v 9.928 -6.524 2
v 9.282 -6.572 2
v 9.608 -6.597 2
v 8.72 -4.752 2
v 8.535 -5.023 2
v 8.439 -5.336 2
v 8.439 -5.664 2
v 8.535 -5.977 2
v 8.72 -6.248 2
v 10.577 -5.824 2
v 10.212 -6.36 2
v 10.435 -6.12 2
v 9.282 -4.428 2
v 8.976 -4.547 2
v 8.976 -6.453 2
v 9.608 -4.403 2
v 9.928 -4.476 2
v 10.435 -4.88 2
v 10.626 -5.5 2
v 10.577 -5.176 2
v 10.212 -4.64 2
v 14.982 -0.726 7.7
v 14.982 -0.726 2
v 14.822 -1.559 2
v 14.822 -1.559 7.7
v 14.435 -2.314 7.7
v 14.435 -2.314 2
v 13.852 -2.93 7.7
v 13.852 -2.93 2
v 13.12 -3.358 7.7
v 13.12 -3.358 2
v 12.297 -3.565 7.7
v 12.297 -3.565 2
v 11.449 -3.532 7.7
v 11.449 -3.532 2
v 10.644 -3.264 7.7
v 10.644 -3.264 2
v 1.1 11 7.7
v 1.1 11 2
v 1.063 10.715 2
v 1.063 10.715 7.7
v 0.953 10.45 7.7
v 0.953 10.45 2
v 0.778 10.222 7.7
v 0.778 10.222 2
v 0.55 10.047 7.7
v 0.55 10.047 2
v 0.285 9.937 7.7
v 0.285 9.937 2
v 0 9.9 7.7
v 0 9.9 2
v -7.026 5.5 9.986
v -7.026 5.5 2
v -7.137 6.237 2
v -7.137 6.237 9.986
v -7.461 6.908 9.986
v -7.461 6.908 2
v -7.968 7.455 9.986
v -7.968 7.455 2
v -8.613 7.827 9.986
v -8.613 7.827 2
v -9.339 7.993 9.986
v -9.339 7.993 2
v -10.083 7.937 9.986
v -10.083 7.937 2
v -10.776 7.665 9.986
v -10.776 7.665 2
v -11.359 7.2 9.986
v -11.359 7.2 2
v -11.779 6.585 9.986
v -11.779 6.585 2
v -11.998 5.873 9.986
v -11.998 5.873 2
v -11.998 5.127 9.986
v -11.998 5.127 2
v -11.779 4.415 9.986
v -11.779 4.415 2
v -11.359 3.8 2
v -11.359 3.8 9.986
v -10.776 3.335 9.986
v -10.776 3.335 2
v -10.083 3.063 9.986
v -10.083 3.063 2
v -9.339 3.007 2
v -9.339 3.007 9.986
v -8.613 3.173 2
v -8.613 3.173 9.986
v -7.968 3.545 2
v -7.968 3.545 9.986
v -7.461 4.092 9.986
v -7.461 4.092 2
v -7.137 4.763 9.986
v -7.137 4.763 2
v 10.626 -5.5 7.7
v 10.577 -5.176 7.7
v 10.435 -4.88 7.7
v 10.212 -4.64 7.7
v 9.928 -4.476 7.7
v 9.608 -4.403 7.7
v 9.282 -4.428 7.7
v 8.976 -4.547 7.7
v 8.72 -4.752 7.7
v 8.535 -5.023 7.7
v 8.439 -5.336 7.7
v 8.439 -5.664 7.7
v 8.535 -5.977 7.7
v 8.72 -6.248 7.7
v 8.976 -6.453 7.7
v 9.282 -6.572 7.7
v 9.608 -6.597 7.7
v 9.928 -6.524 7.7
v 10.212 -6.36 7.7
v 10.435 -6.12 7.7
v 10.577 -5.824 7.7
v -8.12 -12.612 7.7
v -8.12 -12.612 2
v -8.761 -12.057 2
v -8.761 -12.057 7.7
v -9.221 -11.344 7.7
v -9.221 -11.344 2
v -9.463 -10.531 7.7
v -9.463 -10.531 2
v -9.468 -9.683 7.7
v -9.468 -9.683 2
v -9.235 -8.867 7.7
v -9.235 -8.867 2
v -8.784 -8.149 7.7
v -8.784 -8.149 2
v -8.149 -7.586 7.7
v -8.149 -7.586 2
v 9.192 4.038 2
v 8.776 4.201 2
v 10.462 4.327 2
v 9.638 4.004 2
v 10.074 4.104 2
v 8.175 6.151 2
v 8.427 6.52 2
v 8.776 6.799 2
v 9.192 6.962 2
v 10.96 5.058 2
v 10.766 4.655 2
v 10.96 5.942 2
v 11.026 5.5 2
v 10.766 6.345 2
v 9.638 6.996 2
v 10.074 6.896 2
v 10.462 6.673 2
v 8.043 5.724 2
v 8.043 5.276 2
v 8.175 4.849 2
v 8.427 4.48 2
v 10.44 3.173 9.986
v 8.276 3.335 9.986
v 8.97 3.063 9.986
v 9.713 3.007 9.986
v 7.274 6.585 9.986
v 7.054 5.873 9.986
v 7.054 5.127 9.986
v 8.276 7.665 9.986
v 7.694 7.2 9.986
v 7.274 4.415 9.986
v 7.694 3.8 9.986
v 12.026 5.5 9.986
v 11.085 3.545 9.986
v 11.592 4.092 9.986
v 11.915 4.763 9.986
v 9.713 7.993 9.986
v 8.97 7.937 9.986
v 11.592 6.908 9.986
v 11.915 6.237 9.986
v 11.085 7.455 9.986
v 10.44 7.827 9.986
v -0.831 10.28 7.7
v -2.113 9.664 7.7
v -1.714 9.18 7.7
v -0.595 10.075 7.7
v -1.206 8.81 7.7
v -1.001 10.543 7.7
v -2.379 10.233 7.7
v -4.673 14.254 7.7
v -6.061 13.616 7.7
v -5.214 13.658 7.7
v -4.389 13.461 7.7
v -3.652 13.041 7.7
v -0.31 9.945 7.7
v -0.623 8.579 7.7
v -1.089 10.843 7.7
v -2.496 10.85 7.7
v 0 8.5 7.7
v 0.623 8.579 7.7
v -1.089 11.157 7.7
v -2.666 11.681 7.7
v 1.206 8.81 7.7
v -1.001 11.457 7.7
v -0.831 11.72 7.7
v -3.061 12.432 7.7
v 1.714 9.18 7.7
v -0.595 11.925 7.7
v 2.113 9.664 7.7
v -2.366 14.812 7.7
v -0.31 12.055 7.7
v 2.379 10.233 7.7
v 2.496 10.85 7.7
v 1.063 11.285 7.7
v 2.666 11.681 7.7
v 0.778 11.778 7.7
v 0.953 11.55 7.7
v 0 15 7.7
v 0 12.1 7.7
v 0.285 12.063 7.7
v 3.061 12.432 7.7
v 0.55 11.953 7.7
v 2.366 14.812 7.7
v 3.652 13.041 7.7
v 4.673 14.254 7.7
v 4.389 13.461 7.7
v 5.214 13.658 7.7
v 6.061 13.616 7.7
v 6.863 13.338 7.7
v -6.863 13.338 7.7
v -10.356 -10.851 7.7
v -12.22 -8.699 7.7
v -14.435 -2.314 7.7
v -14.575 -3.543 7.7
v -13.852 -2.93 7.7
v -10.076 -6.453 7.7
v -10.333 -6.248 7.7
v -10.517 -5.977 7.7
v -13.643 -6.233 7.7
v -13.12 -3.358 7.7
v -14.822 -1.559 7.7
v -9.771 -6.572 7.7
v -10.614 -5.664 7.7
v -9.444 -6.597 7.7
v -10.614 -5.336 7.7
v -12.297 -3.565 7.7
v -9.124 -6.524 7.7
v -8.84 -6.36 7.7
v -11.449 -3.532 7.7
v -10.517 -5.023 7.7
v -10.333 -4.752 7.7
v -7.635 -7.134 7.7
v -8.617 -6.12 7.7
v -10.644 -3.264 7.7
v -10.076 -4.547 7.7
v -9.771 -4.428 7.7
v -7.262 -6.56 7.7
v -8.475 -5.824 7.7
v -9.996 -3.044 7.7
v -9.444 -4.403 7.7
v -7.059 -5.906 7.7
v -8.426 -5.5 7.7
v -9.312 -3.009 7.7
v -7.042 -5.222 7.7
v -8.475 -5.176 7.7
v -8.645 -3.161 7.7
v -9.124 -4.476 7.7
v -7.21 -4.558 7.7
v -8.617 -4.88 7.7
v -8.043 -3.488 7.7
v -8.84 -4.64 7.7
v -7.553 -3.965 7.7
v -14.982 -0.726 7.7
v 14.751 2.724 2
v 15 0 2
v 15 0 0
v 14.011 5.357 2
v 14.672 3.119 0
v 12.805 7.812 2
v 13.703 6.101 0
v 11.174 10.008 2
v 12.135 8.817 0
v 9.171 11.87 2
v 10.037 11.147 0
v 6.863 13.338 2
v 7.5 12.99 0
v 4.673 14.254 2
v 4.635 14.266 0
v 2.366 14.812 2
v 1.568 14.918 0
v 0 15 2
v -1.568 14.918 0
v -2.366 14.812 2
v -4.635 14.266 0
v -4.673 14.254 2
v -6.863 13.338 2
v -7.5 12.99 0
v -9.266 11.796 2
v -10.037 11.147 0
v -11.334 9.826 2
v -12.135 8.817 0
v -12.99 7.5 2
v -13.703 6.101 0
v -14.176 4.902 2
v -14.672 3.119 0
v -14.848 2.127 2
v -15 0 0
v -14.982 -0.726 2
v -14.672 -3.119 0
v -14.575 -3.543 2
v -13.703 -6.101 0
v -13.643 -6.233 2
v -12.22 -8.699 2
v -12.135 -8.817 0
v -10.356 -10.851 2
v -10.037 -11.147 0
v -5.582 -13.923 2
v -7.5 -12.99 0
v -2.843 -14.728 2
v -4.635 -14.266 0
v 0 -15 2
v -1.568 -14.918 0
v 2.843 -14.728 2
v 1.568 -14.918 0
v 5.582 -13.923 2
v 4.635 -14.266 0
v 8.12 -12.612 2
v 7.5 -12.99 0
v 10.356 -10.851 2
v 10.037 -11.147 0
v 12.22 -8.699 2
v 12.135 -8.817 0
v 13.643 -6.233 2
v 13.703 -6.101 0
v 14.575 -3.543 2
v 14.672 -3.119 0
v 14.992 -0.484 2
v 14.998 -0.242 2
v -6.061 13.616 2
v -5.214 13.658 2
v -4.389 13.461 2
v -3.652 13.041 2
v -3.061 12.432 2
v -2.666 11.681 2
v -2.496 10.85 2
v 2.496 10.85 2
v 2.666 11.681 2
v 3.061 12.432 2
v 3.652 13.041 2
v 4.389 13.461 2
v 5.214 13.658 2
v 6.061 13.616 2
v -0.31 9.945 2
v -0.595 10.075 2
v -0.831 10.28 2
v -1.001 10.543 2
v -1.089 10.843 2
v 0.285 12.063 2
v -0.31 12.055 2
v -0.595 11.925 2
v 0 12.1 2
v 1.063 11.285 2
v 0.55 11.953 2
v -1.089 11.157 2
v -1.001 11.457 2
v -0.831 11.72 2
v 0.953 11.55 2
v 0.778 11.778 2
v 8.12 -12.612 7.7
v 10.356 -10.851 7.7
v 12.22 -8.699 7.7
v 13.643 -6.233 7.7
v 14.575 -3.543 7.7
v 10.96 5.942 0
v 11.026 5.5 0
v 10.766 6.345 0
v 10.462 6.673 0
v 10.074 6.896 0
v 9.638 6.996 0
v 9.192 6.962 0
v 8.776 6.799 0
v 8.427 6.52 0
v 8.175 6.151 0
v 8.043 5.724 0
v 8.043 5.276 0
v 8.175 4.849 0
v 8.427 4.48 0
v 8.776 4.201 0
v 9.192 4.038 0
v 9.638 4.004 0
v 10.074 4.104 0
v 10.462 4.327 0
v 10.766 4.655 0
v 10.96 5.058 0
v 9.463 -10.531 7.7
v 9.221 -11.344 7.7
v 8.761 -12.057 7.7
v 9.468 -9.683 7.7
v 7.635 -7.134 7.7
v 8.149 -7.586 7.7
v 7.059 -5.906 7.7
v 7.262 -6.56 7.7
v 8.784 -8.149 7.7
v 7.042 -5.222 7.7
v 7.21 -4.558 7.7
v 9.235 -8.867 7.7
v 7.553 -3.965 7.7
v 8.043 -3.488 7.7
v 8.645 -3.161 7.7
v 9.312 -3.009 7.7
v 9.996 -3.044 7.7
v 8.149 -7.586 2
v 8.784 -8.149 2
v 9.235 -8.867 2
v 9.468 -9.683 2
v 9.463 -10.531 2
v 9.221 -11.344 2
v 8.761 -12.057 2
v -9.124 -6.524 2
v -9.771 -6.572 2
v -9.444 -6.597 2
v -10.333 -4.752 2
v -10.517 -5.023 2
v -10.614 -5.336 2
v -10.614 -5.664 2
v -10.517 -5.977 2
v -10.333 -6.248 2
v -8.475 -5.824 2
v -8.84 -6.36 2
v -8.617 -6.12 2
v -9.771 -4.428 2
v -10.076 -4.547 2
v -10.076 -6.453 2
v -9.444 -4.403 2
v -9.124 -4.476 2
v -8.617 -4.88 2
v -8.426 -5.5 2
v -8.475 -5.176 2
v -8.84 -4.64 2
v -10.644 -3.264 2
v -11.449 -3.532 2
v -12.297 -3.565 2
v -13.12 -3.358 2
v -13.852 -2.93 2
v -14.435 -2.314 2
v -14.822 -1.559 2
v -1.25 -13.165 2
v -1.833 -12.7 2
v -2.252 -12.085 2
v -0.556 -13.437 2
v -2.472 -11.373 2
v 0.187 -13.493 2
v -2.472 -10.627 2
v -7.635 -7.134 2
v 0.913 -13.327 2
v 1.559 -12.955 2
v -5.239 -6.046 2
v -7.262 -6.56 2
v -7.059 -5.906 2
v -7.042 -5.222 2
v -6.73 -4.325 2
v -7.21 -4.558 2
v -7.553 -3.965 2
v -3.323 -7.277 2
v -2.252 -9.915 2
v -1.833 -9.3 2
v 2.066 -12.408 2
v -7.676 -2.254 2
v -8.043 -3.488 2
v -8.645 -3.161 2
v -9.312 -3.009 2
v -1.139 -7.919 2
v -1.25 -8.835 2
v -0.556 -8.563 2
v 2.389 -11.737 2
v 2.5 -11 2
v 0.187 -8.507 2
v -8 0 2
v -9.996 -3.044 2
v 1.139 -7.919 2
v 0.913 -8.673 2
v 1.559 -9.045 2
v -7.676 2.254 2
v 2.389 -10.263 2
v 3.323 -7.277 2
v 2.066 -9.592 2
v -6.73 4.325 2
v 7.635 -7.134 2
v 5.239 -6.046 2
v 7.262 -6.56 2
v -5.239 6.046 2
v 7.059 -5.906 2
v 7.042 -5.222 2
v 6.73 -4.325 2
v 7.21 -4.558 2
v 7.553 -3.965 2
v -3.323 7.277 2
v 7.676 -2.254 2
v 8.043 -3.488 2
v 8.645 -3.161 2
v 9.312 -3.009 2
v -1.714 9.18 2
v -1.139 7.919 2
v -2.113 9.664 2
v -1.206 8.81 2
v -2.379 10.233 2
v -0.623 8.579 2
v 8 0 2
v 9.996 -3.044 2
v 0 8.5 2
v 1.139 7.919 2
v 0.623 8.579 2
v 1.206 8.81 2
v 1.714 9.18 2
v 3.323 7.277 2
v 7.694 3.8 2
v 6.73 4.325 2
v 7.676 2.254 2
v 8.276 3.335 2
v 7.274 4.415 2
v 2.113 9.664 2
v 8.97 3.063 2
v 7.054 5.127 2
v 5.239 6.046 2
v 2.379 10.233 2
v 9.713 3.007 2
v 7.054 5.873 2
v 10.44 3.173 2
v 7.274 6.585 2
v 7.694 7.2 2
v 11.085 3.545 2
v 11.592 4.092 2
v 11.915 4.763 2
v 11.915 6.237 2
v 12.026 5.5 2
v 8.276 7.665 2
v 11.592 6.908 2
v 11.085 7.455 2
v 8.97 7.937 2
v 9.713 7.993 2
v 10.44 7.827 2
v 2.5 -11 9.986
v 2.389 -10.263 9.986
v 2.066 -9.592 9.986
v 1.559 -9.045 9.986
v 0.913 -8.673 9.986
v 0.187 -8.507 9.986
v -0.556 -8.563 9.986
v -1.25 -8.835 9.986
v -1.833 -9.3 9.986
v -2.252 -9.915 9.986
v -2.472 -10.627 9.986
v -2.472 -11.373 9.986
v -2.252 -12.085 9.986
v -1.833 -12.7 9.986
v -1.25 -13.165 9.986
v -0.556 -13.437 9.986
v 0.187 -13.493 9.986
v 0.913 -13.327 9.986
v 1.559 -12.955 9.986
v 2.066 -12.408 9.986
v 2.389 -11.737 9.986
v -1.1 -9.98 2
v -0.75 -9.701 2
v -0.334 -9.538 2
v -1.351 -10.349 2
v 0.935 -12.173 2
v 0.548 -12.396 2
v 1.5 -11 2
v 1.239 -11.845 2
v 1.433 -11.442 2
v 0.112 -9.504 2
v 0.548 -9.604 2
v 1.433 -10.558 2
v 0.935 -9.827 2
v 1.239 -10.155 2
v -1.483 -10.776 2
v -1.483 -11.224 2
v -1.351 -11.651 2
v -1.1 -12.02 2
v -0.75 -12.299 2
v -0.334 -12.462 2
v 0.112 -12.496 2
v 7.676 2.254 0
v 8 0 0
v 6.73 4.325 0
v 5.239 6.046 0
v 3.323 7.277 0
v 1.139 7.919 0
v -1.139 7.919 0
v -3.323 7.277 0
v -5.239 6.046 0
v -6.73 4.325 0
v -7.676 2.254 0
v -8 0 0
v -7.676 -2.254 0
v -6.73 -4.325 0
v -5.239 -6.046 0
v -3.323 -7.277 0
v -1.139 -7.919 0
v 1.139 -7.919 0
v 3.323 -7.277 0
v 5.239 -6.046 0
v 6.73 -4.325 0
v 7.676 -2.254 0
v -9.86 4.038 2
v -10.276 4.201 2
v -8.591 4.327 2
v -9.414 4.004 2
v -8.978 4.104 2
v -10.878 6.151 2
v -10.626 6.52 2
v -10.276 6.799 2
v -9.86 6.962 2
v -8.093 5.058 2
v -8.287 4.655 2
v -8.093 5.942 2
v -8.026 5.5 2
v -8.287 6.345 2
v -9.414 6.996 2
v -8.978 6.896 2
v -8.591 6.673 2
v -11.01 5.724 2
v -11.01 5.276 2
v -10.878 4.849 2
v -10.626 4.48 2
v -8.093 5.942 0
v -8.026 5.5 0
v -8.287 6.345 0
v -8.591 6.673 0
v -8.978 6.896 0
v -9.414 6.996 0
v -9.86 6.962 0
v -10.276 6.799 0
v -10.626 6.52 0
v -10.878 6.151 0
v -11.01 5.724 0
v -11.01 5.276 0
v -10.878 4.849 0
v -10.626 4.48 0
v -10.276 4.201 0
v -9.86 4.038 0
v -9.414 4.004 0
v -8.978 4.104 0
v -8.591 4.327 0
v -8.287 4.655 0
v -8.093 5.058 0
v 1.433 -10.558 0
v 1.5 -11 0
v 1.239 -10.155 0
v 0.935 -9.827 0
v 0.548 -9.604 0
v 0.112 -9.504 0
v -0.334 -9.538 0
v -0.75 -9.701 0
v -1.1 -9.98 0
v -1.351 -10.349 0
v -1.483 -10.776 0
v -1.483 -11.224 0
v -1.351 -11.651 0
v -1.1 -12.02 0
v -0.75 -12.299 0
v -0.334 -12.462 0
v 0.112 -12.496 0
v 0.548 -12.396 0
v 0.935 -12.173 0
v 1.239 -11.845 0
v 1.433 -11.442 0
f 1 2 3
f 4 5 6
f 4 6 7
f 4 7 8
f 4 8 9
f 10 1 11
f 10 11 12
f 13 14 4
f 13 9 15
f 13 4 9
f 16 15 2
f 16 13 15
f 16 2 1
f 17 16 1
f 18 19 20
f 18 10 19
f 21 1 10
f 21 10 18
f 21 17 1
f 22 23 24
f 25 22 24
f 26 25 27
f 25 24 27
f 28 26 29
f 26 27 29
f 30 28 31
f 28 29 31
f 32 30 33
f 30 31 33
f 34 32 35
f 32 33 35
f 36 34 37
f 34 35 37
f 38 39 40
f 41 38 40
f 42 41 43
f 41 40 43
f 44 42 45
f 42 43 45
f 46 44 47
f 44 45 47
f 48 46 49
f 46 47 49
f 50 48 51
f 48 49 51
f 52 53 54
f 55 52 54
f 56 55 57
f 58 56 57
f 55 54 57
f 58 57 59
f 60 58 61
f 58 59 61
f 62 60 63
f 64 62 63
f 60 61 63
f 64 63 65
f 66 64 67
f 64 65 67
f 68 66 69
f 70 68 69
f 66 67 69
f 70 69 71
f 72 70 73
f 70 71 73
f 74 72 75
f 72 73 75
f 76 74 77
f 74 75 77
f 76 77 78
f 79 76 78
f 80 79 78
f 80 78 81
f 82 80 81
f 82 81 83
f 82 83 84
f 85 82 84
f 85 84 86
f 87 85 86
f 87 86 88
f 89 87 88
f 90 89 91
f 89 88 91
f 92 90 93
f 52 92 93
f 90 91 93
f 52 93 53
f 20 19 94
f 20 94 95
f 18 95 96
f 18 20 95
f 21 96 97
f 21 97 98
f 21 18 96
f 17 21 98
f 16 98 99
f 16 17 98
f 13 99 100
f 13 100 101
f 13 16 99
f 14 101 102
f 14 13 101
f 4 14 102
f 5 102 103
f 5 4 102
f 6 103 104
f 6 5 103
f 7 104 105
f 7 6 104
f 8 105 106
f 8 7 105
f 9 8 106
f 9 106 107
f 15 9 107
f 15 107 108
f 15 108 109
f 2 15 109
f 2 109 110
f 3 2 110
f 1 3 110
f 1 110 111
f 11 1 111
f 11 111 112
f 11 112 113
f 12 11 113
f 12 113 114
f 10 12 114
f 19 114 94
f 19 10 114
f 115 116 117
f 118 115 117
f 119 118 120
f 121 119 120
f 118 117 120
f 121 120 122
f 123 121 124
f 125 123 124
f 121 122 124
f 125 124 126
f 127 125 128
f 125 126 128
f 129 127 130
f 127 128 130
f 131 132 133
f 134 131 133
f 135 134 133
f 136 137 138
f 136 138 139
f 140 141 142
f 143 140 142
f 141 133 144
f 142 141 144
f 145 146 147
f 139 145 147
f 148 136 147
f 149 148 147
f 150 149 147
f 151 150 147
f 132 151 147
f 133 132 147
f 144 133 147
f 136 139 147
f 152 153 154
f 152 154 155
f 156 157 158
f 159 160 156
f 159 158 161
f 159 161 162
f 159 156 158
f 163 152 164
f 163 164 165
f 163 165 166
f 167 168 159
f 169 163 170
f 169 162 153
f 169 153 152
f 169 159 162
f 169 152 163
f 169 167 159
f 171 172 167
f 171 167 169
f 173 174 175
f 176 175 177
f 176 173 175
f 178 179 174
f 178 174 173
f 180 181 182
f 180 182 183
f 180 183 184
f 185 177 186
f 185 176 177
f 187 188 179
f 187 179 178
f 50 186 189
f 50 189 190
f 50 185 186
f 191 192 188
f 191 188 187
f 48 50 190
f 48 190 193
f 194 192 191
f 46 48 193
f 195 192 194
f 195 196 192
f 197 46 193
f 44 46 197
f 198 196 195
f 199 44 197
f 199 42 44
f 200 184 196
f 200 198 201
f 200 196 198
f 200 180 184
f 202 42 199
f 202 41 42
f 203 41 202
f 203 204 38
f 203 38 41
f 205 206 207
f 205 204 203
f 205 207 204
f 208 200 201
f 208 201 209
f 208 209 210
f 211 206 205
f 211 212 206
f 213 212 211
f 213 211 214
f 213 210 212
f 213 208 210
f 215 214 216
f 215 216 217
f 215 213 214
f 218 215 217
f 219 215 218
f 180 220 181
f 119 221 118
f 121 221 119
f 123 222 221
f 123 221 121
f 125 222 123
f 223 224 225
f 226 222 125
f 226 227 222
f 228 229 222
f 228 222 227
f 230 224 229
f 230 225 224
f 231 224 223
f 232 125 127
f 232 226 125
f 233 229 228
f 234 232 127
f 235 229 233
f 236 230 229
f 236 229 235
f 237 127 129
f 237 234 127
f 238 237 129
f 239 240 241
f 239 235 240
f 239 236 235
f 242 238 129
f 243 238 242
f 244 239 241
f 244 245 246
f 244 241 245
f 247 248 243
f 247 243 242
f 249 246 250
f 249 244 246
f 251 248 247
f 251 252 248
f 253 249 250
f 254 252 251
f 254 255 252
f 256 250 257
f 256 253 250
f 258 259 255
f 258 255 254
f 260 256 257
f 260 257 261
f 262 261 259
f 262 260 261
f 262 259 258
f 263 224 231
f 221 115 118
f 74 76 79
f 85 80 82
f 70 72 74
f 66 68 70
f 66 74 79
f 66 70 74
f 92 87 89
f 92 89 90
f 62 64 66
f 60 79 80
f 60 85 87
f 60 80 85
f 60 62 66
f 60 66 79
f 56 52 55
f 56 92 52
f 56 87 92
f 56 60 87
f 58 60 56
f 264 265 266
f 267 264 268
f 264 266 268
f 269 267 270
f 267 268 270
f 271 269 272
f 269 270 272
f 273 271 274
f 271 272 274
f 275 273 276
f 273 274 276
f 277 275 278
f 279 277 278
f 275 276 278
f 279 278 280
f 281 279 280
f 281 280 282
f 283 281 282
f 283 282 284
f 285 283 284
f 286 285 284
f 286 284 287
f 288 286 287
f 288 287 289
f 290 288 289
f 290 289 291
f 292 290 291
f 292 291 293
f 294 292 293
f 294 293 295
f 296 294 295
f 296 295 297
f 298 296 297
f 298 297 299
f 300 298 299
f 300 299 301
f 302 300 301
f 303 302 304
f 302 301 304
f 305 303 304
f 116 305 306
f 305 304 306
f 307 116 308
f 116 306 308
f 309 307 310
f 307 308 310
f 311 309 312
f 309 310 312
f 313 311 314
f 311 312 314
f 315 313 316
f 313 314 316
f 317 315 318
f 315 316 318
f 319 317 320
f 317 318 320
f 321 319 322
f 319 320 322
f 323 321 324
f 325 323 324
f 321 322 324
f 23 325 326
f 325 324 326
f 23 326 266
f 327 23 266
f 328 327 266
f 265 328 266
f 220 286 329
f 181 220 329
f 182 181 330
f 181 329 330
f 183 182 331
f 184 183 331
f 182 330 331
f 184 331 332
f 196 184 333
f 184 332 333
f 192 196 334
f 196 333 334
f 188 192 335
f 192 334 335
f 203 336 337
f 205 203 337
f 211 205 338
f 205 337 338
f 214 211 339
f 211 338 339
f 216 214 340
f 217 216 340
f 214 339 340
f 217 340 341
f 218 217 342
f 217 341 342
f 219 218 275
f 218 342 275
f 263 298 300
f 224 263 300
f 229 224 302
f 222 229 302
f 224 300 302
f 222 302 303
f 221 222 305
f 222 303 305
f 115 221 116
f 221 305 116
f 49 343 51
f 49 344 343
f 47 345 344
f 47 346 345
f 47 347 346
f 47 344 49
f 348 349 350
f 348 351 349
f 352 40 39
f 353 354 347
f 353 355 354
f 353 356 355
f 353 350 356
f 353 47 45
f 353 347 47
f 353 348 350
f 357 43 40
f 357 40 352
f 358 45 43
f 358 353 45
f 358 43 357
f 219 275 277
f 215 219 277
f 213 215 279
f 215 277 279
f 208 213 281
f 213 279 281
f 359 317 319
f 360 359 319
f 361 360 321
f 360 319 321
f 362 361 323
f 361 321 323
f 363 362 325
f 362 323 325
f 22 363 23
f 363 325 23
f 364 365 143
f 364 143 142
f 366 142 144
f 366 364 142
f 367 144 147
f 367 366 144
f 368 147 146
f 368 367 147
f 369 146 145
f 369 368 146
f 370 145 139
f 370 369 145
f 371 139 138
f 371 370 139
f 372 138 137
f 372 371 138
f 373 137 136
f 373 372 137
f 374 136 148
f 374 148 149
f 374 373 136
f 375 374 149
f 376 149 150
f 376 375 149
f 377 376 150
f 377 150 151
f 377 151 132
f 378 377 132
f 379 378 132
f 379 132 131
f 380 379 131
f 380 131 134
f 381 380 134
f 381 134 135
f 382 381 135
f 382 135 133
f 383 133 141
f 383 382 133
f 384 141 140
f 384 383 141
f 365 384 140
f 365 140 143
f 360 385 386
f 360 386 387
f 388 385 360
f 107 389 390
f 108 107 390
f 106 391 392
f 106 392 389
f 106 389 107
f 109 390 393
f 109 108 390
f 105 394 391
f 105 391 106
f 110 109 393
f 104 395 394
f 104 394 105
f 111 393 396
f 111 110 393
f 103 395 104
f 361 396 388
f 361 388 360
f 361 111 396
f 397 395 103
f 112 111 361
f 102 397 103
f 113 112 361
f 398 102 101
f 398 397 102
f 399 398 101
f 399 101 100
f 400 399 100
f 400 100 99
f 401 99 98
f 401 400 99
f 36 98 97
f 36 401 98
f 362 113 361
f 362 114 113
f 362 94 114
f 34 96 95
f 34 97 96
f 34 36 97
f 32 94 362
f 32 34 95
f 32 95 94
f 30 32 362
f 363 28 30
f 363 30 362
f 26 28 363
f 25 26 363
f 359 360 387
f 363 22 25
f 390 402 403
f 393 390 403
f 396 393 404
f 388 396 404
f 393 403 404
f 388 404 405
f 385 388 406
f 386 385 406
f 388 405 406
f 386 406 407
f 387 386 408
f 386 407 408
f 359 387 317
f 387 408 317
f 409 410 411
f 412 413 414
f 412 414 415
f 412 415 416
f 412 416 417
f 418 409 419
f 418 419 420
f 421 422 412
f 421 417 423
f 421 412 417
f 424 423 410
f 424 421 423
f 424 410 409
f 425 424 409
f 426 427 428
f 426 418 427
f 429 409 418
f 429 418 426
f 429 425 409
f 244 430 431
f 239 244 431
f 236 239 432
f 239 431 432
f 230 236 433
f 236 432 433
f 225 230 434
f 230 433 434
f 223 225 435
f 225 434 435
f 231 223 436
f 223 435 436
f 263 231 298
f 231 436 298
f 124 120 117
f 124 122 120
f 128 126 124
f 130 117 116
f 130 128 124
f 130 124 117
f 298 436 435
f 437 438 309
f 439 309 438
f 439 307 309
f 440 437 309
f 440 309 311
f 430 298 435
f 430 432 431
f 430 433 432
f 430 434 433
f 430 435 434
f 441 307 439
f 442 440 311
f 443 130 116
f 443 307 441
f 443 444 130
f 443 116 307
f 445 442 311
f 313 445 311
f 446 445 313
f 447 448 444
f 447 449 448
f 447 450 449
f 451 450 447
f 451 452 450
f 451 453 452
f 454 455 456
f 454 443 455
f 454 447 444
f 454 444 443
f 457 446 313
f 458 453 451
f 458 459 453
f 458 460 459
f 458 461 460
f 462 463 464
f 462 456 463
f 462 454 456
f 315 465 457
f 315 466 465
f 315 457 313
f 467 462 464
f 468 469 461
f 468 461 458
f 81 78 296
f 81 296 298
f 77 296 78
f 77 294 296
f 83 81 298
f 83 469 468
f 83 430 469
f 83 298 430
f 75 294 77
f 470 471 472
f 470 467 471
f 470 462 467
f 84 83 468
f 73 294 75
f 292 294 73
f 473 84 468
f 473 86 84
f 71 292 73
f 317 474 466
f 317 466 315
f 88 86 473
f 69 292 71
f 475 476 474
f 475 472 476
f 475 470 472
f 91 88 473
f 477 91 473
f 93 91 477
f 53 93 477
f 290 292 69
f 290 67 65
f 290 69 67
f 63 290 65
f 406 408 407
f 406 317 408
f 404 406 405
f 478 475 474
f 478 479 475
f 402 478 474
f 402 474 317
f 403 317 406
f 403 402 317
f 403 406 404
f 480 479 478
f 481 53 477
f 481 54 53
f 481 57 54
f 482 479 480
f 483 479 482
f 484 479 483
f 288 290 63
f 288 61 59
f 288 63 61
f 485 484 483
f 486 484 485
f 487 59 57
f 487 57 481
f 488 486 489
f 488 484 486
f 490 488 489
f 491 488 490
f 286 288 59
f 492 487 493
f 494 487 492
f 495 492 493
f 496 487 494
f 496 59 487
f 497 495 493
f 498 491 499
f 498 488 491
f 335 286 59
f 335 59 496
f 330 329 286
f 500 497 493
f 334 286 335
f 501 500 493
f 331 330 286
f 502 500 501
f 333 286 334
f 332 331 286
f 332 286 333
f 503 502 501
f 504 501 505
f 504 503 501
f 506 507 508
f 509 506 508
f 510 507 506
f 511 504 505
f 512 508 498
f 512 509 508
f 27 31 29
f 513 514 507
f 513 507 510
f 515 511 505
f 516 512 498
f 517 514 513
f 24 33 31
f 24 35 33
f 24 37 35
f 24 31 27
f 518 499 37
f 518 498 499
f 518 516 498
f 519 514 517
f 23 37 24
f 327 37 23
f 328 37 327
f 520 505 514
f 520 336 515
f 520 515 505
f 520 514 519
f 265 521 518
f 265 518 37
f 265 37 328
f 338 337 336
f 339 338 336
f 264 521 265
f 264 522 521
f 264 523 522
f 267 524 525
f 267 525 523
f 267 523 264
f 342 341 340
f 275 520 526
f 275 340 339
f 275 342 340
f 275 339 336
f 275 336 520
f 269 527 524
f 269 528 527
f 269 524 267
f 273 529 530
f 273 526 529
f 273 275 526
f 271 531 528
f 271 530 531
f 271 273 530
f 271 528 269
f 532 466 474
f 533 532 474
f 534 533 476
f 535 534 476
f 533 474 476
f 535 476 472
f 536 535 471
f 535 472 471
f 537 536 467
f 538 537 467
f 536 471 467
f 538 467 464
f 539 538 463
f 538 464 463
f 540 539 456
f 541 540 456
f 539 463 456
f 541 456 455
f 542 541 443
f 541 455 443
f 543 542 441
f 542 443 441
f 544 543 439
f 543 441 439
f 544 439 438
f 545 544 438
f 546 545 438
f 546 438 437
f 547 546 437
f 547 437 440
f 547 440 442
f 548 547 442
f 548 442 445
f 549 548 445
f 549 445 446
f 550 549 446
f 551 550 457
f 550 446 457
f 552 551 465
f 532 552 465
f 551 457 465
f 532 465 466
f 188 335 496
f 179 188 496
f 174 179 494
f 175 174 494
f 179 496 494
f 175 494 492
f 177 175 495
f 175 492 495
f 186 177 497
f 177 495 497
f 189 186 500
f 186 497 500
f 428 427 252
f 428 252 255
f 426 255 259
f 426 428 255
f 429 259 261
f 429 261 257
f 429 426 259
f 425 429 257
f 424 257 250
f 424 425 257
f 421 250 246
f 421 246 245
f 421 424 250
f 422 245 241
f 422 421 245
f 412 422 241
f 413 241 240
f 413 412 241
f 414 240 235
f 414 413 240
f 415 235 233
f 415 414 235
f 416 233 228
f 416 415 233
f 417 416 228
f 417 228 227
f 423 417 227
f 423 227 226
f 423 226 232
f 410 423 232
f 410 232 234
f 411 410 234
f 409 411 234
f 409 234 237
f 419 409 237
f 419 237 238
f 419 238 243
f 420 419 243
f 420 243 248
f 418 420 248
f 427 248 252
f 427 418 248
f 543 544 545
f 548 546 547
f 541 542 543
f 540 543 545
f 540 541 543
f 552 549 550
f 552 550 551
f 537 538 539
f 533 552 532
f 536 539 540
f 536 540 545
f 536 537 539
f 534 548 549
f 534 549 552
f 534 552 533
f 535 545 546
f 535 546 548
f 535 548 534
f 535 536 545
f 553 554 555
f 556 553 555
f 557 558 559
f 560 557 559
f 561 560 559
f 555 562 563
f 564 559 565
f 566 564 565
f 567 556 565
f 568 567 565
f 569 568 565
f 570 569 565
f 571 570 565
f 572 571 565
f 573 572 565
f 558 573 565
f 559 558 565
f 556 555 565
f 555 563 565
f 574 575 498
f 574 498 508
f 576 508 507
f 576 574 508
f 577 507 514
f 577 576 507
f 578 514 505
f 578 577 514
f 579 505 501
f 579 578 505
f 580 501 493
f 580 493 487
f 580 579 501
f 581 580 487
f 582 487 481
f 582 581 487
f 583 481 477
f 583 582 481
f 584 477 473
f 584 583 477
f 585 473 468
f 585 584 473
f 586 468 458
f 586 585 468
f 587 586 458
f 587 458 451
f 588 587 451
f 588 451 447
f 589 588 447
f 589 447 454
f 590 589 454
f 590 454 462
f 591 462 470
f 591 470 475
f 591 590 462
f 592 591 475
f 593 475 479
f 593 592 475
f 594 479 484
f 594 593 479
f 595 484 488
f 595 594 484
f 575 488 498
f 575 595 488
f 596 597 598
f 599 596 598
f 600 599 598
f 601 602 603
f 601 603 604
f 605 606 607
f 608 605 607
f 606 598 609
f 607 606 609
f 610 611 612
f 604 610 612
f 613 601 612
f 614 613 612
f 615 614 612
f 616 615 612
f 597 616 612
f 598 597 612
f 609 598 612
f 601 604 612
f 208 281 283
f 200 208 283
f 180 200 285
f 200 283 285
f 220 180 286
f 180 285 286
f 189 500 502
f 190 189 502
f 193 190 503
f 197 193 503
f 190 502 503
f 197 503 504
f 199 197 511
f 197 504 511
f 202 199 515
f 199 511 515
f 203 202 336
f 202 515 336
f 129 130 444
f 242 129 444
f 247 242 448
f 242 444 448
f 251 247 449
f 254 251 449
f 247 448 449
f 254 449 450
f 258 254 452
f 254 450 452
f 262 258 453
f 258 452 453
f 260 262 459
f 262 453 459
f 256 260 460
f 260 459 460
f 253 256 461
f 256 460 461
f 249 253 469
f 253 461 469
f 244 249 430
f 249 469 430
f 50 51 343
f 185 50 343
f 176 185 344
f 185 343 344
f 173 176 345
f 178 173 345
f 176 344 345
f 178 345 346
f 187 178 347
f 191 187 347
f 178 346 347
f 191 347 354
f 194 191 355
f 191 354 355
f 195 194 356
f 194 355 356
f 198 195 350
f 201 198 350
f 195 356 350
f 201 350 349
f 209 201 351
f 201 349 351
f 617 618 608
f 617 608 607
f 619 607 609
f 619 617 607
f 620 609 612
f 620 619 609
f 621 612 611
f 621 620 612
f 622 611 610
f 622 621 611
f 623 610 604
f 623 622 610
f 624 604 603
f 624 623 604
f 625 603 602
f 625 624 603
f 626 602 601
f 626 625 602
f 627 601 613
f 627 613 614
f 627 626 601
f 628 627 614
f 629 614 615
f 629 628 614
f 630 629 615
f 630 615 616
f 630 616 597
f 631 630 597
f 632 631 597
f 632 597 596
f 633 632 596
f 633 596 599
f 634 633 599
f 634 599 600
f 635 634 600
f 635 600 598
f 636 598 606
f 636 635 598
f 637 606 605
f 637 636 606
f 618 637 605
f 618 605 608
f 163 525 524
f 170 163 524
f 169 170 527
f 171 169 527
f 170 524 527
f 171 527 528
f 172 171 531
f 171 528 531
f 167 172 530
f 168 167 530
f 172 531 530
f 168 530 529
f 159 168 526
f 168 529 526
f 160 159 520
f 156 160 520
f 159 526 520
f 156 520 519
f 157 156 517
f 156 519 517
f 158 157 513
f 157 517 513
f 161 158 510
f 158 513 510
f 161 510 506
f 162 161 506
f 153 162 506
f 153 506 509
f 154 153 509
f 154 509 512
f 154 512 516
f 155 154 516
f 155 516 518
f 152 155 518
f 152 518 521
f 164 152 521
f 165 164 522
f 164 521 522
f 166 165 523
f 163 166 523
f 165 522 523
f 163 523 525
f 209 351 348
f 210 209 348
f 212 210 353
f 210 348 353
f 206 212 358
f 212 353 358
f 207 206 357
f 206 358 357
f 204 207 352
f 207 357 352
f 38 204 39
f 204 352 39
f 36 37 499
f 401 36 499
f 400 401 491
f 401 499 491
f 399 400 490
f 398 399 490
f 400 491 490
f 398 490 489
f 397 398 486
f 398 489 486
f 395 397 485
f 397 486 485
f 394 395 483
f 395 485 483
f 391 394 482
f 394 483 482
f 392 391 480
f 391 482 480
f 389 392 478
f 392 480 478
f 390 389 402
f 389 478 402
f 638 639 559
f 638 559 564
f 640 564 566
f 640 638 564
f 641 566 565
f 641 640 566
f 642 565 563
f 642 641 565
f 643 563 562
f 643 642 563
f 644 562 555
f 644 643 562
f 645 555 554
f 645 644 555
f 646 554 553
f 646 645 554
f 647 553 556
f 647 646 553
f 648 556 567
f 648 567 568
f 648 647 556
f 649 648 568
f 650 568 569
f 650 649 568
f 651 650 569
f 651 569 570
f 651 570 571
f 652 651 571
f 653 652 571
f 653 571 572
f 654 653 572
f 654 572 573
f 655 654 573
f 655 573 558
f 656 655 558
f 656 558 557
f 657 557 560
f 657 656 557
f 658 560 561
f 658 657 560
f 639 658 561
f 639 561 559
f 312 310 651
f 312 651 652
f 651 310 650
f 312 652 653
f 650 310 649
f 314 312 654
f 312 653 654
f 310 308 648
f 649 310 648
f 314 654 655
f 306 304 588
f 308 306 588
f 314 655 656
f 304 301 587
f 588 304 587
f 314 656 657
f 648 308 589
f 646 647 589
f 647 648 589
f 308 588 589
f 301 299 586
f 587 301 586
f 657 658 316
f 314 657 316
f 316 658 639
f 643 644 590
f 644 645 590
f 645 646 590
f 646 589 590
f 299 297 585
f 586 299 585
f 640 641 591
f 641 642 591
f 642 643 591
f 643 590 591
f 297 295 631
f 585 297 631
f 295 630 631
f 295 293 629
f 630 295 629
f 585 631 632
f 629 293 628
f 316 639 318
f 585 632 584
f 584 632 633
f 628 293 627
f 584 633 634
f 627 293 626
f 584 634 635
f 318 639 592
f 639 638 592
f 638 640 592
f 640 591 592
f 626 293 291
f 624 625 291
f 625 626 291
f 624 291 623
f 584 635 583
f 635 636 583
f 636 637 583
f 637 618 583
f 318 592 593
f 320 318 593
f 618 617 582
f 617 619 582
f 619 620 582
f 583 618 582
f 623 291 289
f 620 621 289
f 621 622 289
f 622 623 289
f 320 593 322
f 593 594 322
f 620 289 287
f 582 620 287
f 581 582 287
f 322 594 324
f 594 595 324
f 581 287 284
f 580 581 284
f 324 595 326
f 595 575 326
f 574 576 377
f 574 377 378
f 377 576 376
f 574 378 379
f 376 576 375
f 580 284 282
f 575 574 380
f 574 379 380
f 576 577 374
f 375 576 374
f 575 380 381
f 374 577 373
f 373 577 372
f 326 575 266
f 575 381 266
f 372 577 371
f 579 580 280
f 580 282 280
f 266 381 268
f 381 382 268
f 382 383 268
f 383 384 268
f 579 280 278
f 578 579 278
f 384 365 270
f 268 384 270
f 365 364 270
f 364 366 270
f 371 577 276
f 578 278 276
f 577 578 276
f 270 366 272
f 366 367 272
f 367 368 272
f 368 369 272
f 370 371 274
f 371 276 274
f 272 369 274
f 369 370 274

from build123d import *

# Parameters (mm, degrees)
SKETCH1_R           = 15
SKETCH1_R_2         = 8
SKETCH1_R_3         = 1.5
BOSS_EXTRUDE1_DEPTH = 2
SKETCH2_R           = 2.5
SKETCH2_R_2         = 1.5
BOSS_EXTRUDE2_DEPTH = 7.985619116
SKETCH3_R           = 1.1
BOSS_EXTRUDE3_DEPTH = 5.7


with BuildPart() as part:
    # Sketch1 → Boss-Extrude1 (new body)
    with BuildSketch(Plane.XY):
        Circle(SKETCH1_R)
        Circle(SKETCH1_R_2, mode=Mode.SUBTRACT)
        with Locations((9.526279442, 5.5)):
            Circle(SKETCH1_R_3, mode=Mode.SUBTRACT)
        with Locations((0, -11)):
            Circle(SKETCH1_R_3, mode=Mode.SUBTRACT)
        with Locations((-9.526279442, 5.5)):
            Circle(SKETCH1_R_3, mode=Mode.SUBTRACT)
    extrude(amount=BOSS_EXTRUDE1_DEPTH)

    # Sketch2 → Boss-Extrude2 (add)
    # profile 1 of 6: a face of its own
    with BuildSketch(Plane.XY.offset(2)):
        with Locations((-9.526279442, 5.5)):
            Circle(SKETCH2_R)
        with Locations((-9.526279442, 5.5)):
            Circle(SKETCH2_R_2, mode=Mode.SUBTRACT)
    # profile 2 of 6: a face of its own
    with BuildSketch(Plane.XY.offset(2)):
        with Locations((9.526279442, 5.5)):
            Circle(SKETCH2_R)
        with Locations((9.526279442, 5.5)):
            Circle(SKETCH2_R_2, mode=Mode.SUBTRACT)
    # profile 3 of 6: a face of its own
    with BuildSketch(Plane.XY.offset(2)):
        with Locations((-9.526279442, 5.5)):
            Circle(SKETCH2_R_2)
    # profile 4 of 6: a face of its own
    with BuildSketch(Plane.XY.offset(2)):
        with Locations((9.526279442, 5.5)):
            Circle(SKETCH2_R_2)
    # profile 5 of 6: a face of its own
    with BuildSketch(Plane.XY.offset(2)):
        with Locations((0, -11)):
            Circle(SKETCH2_R)
        with Locations((0, -11)):
            Circle(SKETCH2_R_2, mode=Mode.SUBTRACT)
    # profile 6 of 6: a face of its own
    with BuildSketch(Plane.XY.offset(2)):
        with Locations((0, -11)):
            Circle(SKETCH2_R_2)
    extrude(amount=BOSS_EXTRUDE2_DEPTH)

    # Sketch3 → Boss-Extrude3 (add)
    # profile 1 of 4: a face of its own
    with BuildSketch(Plane.XY.offset(2)):
        with BuildLine():
            ThreePointArc((-10.644308739, -3.263929677), (-13.500919136, -3.170017803), (-14.982429868, -0.725806611))
            ThreePointArc((-14.982429868, -0.725806611), (-12.990381057, -7.5), (-8.119781897, -12.612261571))
            ThreePointArc((-8.119781897, -12.612261571), (-9.495775516, -10.107130045), (-8.148800385, -7.586276935))
            ThreePointArc((-8.148800385, -7.586276935), (-7.361215932, -4.25), (-10.644308739, -3.263929677))
        make_face()
        with Locations((-9.526279442, -5.5)):
            Circle(SKETCH3_R, mode=Mode.SUBTRACT)
    # profile 2 of 4: a face of its own
    with BuildSketch(Plane.XY.offset(2)):
        with BuildLine():
            ThreePointArc((8.119781897, -12.612261571), (12.990381057, -7.5), (14.982429868, -0.725806611))
            ThreePointArc((14.982429868, -0.725806611), (13.500919136, -3.170017803), (10.644308739, -3.263929677))
            ThreePointArc((10.644308739, -3.263929677), (7.361215932, -4.25), (8.148800385, -7.586276935))
            ThreePointArc((8.148800385, -7.586276935), (9.495775516, -10.107130045), (8.119781897, -12.612261571))
        make_face()
        with Locations((9.526279442, -5.5)):
            Circle(SKETCH3_R, mode=Mode.SUBTRACT)
    # profile 3 of 4: a face of its own
    with BuildSketch(Plane.XY.offset(2)):
        with BuildLine():
            ThreePointArc((-2.495508353, 10.850206612), (-1.713988992, 9.18004348), (0, 8.5))
            Line((0, 8.5), (0, 9.9))
            ThreePointArc((0, 9.9), (-1.1, 11), (0, 12.1))
            Line((0, 12.1), (0, 15))
            ThreePointArc((0, 15), (-3.530508269, 14.578597716), (-6.862647971, 13.338068182))
            ThreePointArc((-6.862647971, 13.338068182), (-4.00514362, 13.277147848), (-2.495508353, 10.850206612))
        make_face()
    # profile 4 of 4: a face of its own
    with BuildSketch(Plane.XY.offset(2)):
        with BuildLine():
            Line((0, 9.9), (0, 8.5))
            ThreePointArc((0, 8.5), (1.713988992, 9.18004348), (2.495508353, 10.850206612))
            ThreePointArc((2.495508353, 10.850206612), (4.00514362, 13.277147848), (6.862647971, 13.338068182))
            ThreePointArc((6.862647971, 13.338068182), (3.530508269, 14.578597716), (0, 15))
            Line((0, 15), (0, 12.1))
            ThreePointArc((0, 12.1), (0.777817459, 11.777817459), (1.1, 11))
            ThreePointArc((1.1, 11), (0.777817459, 10.222182541), (0, 9.9))
        make_face()
    extrude(amount=BOSS_EXTRUDE3_DEPTH)


solid = part.part
